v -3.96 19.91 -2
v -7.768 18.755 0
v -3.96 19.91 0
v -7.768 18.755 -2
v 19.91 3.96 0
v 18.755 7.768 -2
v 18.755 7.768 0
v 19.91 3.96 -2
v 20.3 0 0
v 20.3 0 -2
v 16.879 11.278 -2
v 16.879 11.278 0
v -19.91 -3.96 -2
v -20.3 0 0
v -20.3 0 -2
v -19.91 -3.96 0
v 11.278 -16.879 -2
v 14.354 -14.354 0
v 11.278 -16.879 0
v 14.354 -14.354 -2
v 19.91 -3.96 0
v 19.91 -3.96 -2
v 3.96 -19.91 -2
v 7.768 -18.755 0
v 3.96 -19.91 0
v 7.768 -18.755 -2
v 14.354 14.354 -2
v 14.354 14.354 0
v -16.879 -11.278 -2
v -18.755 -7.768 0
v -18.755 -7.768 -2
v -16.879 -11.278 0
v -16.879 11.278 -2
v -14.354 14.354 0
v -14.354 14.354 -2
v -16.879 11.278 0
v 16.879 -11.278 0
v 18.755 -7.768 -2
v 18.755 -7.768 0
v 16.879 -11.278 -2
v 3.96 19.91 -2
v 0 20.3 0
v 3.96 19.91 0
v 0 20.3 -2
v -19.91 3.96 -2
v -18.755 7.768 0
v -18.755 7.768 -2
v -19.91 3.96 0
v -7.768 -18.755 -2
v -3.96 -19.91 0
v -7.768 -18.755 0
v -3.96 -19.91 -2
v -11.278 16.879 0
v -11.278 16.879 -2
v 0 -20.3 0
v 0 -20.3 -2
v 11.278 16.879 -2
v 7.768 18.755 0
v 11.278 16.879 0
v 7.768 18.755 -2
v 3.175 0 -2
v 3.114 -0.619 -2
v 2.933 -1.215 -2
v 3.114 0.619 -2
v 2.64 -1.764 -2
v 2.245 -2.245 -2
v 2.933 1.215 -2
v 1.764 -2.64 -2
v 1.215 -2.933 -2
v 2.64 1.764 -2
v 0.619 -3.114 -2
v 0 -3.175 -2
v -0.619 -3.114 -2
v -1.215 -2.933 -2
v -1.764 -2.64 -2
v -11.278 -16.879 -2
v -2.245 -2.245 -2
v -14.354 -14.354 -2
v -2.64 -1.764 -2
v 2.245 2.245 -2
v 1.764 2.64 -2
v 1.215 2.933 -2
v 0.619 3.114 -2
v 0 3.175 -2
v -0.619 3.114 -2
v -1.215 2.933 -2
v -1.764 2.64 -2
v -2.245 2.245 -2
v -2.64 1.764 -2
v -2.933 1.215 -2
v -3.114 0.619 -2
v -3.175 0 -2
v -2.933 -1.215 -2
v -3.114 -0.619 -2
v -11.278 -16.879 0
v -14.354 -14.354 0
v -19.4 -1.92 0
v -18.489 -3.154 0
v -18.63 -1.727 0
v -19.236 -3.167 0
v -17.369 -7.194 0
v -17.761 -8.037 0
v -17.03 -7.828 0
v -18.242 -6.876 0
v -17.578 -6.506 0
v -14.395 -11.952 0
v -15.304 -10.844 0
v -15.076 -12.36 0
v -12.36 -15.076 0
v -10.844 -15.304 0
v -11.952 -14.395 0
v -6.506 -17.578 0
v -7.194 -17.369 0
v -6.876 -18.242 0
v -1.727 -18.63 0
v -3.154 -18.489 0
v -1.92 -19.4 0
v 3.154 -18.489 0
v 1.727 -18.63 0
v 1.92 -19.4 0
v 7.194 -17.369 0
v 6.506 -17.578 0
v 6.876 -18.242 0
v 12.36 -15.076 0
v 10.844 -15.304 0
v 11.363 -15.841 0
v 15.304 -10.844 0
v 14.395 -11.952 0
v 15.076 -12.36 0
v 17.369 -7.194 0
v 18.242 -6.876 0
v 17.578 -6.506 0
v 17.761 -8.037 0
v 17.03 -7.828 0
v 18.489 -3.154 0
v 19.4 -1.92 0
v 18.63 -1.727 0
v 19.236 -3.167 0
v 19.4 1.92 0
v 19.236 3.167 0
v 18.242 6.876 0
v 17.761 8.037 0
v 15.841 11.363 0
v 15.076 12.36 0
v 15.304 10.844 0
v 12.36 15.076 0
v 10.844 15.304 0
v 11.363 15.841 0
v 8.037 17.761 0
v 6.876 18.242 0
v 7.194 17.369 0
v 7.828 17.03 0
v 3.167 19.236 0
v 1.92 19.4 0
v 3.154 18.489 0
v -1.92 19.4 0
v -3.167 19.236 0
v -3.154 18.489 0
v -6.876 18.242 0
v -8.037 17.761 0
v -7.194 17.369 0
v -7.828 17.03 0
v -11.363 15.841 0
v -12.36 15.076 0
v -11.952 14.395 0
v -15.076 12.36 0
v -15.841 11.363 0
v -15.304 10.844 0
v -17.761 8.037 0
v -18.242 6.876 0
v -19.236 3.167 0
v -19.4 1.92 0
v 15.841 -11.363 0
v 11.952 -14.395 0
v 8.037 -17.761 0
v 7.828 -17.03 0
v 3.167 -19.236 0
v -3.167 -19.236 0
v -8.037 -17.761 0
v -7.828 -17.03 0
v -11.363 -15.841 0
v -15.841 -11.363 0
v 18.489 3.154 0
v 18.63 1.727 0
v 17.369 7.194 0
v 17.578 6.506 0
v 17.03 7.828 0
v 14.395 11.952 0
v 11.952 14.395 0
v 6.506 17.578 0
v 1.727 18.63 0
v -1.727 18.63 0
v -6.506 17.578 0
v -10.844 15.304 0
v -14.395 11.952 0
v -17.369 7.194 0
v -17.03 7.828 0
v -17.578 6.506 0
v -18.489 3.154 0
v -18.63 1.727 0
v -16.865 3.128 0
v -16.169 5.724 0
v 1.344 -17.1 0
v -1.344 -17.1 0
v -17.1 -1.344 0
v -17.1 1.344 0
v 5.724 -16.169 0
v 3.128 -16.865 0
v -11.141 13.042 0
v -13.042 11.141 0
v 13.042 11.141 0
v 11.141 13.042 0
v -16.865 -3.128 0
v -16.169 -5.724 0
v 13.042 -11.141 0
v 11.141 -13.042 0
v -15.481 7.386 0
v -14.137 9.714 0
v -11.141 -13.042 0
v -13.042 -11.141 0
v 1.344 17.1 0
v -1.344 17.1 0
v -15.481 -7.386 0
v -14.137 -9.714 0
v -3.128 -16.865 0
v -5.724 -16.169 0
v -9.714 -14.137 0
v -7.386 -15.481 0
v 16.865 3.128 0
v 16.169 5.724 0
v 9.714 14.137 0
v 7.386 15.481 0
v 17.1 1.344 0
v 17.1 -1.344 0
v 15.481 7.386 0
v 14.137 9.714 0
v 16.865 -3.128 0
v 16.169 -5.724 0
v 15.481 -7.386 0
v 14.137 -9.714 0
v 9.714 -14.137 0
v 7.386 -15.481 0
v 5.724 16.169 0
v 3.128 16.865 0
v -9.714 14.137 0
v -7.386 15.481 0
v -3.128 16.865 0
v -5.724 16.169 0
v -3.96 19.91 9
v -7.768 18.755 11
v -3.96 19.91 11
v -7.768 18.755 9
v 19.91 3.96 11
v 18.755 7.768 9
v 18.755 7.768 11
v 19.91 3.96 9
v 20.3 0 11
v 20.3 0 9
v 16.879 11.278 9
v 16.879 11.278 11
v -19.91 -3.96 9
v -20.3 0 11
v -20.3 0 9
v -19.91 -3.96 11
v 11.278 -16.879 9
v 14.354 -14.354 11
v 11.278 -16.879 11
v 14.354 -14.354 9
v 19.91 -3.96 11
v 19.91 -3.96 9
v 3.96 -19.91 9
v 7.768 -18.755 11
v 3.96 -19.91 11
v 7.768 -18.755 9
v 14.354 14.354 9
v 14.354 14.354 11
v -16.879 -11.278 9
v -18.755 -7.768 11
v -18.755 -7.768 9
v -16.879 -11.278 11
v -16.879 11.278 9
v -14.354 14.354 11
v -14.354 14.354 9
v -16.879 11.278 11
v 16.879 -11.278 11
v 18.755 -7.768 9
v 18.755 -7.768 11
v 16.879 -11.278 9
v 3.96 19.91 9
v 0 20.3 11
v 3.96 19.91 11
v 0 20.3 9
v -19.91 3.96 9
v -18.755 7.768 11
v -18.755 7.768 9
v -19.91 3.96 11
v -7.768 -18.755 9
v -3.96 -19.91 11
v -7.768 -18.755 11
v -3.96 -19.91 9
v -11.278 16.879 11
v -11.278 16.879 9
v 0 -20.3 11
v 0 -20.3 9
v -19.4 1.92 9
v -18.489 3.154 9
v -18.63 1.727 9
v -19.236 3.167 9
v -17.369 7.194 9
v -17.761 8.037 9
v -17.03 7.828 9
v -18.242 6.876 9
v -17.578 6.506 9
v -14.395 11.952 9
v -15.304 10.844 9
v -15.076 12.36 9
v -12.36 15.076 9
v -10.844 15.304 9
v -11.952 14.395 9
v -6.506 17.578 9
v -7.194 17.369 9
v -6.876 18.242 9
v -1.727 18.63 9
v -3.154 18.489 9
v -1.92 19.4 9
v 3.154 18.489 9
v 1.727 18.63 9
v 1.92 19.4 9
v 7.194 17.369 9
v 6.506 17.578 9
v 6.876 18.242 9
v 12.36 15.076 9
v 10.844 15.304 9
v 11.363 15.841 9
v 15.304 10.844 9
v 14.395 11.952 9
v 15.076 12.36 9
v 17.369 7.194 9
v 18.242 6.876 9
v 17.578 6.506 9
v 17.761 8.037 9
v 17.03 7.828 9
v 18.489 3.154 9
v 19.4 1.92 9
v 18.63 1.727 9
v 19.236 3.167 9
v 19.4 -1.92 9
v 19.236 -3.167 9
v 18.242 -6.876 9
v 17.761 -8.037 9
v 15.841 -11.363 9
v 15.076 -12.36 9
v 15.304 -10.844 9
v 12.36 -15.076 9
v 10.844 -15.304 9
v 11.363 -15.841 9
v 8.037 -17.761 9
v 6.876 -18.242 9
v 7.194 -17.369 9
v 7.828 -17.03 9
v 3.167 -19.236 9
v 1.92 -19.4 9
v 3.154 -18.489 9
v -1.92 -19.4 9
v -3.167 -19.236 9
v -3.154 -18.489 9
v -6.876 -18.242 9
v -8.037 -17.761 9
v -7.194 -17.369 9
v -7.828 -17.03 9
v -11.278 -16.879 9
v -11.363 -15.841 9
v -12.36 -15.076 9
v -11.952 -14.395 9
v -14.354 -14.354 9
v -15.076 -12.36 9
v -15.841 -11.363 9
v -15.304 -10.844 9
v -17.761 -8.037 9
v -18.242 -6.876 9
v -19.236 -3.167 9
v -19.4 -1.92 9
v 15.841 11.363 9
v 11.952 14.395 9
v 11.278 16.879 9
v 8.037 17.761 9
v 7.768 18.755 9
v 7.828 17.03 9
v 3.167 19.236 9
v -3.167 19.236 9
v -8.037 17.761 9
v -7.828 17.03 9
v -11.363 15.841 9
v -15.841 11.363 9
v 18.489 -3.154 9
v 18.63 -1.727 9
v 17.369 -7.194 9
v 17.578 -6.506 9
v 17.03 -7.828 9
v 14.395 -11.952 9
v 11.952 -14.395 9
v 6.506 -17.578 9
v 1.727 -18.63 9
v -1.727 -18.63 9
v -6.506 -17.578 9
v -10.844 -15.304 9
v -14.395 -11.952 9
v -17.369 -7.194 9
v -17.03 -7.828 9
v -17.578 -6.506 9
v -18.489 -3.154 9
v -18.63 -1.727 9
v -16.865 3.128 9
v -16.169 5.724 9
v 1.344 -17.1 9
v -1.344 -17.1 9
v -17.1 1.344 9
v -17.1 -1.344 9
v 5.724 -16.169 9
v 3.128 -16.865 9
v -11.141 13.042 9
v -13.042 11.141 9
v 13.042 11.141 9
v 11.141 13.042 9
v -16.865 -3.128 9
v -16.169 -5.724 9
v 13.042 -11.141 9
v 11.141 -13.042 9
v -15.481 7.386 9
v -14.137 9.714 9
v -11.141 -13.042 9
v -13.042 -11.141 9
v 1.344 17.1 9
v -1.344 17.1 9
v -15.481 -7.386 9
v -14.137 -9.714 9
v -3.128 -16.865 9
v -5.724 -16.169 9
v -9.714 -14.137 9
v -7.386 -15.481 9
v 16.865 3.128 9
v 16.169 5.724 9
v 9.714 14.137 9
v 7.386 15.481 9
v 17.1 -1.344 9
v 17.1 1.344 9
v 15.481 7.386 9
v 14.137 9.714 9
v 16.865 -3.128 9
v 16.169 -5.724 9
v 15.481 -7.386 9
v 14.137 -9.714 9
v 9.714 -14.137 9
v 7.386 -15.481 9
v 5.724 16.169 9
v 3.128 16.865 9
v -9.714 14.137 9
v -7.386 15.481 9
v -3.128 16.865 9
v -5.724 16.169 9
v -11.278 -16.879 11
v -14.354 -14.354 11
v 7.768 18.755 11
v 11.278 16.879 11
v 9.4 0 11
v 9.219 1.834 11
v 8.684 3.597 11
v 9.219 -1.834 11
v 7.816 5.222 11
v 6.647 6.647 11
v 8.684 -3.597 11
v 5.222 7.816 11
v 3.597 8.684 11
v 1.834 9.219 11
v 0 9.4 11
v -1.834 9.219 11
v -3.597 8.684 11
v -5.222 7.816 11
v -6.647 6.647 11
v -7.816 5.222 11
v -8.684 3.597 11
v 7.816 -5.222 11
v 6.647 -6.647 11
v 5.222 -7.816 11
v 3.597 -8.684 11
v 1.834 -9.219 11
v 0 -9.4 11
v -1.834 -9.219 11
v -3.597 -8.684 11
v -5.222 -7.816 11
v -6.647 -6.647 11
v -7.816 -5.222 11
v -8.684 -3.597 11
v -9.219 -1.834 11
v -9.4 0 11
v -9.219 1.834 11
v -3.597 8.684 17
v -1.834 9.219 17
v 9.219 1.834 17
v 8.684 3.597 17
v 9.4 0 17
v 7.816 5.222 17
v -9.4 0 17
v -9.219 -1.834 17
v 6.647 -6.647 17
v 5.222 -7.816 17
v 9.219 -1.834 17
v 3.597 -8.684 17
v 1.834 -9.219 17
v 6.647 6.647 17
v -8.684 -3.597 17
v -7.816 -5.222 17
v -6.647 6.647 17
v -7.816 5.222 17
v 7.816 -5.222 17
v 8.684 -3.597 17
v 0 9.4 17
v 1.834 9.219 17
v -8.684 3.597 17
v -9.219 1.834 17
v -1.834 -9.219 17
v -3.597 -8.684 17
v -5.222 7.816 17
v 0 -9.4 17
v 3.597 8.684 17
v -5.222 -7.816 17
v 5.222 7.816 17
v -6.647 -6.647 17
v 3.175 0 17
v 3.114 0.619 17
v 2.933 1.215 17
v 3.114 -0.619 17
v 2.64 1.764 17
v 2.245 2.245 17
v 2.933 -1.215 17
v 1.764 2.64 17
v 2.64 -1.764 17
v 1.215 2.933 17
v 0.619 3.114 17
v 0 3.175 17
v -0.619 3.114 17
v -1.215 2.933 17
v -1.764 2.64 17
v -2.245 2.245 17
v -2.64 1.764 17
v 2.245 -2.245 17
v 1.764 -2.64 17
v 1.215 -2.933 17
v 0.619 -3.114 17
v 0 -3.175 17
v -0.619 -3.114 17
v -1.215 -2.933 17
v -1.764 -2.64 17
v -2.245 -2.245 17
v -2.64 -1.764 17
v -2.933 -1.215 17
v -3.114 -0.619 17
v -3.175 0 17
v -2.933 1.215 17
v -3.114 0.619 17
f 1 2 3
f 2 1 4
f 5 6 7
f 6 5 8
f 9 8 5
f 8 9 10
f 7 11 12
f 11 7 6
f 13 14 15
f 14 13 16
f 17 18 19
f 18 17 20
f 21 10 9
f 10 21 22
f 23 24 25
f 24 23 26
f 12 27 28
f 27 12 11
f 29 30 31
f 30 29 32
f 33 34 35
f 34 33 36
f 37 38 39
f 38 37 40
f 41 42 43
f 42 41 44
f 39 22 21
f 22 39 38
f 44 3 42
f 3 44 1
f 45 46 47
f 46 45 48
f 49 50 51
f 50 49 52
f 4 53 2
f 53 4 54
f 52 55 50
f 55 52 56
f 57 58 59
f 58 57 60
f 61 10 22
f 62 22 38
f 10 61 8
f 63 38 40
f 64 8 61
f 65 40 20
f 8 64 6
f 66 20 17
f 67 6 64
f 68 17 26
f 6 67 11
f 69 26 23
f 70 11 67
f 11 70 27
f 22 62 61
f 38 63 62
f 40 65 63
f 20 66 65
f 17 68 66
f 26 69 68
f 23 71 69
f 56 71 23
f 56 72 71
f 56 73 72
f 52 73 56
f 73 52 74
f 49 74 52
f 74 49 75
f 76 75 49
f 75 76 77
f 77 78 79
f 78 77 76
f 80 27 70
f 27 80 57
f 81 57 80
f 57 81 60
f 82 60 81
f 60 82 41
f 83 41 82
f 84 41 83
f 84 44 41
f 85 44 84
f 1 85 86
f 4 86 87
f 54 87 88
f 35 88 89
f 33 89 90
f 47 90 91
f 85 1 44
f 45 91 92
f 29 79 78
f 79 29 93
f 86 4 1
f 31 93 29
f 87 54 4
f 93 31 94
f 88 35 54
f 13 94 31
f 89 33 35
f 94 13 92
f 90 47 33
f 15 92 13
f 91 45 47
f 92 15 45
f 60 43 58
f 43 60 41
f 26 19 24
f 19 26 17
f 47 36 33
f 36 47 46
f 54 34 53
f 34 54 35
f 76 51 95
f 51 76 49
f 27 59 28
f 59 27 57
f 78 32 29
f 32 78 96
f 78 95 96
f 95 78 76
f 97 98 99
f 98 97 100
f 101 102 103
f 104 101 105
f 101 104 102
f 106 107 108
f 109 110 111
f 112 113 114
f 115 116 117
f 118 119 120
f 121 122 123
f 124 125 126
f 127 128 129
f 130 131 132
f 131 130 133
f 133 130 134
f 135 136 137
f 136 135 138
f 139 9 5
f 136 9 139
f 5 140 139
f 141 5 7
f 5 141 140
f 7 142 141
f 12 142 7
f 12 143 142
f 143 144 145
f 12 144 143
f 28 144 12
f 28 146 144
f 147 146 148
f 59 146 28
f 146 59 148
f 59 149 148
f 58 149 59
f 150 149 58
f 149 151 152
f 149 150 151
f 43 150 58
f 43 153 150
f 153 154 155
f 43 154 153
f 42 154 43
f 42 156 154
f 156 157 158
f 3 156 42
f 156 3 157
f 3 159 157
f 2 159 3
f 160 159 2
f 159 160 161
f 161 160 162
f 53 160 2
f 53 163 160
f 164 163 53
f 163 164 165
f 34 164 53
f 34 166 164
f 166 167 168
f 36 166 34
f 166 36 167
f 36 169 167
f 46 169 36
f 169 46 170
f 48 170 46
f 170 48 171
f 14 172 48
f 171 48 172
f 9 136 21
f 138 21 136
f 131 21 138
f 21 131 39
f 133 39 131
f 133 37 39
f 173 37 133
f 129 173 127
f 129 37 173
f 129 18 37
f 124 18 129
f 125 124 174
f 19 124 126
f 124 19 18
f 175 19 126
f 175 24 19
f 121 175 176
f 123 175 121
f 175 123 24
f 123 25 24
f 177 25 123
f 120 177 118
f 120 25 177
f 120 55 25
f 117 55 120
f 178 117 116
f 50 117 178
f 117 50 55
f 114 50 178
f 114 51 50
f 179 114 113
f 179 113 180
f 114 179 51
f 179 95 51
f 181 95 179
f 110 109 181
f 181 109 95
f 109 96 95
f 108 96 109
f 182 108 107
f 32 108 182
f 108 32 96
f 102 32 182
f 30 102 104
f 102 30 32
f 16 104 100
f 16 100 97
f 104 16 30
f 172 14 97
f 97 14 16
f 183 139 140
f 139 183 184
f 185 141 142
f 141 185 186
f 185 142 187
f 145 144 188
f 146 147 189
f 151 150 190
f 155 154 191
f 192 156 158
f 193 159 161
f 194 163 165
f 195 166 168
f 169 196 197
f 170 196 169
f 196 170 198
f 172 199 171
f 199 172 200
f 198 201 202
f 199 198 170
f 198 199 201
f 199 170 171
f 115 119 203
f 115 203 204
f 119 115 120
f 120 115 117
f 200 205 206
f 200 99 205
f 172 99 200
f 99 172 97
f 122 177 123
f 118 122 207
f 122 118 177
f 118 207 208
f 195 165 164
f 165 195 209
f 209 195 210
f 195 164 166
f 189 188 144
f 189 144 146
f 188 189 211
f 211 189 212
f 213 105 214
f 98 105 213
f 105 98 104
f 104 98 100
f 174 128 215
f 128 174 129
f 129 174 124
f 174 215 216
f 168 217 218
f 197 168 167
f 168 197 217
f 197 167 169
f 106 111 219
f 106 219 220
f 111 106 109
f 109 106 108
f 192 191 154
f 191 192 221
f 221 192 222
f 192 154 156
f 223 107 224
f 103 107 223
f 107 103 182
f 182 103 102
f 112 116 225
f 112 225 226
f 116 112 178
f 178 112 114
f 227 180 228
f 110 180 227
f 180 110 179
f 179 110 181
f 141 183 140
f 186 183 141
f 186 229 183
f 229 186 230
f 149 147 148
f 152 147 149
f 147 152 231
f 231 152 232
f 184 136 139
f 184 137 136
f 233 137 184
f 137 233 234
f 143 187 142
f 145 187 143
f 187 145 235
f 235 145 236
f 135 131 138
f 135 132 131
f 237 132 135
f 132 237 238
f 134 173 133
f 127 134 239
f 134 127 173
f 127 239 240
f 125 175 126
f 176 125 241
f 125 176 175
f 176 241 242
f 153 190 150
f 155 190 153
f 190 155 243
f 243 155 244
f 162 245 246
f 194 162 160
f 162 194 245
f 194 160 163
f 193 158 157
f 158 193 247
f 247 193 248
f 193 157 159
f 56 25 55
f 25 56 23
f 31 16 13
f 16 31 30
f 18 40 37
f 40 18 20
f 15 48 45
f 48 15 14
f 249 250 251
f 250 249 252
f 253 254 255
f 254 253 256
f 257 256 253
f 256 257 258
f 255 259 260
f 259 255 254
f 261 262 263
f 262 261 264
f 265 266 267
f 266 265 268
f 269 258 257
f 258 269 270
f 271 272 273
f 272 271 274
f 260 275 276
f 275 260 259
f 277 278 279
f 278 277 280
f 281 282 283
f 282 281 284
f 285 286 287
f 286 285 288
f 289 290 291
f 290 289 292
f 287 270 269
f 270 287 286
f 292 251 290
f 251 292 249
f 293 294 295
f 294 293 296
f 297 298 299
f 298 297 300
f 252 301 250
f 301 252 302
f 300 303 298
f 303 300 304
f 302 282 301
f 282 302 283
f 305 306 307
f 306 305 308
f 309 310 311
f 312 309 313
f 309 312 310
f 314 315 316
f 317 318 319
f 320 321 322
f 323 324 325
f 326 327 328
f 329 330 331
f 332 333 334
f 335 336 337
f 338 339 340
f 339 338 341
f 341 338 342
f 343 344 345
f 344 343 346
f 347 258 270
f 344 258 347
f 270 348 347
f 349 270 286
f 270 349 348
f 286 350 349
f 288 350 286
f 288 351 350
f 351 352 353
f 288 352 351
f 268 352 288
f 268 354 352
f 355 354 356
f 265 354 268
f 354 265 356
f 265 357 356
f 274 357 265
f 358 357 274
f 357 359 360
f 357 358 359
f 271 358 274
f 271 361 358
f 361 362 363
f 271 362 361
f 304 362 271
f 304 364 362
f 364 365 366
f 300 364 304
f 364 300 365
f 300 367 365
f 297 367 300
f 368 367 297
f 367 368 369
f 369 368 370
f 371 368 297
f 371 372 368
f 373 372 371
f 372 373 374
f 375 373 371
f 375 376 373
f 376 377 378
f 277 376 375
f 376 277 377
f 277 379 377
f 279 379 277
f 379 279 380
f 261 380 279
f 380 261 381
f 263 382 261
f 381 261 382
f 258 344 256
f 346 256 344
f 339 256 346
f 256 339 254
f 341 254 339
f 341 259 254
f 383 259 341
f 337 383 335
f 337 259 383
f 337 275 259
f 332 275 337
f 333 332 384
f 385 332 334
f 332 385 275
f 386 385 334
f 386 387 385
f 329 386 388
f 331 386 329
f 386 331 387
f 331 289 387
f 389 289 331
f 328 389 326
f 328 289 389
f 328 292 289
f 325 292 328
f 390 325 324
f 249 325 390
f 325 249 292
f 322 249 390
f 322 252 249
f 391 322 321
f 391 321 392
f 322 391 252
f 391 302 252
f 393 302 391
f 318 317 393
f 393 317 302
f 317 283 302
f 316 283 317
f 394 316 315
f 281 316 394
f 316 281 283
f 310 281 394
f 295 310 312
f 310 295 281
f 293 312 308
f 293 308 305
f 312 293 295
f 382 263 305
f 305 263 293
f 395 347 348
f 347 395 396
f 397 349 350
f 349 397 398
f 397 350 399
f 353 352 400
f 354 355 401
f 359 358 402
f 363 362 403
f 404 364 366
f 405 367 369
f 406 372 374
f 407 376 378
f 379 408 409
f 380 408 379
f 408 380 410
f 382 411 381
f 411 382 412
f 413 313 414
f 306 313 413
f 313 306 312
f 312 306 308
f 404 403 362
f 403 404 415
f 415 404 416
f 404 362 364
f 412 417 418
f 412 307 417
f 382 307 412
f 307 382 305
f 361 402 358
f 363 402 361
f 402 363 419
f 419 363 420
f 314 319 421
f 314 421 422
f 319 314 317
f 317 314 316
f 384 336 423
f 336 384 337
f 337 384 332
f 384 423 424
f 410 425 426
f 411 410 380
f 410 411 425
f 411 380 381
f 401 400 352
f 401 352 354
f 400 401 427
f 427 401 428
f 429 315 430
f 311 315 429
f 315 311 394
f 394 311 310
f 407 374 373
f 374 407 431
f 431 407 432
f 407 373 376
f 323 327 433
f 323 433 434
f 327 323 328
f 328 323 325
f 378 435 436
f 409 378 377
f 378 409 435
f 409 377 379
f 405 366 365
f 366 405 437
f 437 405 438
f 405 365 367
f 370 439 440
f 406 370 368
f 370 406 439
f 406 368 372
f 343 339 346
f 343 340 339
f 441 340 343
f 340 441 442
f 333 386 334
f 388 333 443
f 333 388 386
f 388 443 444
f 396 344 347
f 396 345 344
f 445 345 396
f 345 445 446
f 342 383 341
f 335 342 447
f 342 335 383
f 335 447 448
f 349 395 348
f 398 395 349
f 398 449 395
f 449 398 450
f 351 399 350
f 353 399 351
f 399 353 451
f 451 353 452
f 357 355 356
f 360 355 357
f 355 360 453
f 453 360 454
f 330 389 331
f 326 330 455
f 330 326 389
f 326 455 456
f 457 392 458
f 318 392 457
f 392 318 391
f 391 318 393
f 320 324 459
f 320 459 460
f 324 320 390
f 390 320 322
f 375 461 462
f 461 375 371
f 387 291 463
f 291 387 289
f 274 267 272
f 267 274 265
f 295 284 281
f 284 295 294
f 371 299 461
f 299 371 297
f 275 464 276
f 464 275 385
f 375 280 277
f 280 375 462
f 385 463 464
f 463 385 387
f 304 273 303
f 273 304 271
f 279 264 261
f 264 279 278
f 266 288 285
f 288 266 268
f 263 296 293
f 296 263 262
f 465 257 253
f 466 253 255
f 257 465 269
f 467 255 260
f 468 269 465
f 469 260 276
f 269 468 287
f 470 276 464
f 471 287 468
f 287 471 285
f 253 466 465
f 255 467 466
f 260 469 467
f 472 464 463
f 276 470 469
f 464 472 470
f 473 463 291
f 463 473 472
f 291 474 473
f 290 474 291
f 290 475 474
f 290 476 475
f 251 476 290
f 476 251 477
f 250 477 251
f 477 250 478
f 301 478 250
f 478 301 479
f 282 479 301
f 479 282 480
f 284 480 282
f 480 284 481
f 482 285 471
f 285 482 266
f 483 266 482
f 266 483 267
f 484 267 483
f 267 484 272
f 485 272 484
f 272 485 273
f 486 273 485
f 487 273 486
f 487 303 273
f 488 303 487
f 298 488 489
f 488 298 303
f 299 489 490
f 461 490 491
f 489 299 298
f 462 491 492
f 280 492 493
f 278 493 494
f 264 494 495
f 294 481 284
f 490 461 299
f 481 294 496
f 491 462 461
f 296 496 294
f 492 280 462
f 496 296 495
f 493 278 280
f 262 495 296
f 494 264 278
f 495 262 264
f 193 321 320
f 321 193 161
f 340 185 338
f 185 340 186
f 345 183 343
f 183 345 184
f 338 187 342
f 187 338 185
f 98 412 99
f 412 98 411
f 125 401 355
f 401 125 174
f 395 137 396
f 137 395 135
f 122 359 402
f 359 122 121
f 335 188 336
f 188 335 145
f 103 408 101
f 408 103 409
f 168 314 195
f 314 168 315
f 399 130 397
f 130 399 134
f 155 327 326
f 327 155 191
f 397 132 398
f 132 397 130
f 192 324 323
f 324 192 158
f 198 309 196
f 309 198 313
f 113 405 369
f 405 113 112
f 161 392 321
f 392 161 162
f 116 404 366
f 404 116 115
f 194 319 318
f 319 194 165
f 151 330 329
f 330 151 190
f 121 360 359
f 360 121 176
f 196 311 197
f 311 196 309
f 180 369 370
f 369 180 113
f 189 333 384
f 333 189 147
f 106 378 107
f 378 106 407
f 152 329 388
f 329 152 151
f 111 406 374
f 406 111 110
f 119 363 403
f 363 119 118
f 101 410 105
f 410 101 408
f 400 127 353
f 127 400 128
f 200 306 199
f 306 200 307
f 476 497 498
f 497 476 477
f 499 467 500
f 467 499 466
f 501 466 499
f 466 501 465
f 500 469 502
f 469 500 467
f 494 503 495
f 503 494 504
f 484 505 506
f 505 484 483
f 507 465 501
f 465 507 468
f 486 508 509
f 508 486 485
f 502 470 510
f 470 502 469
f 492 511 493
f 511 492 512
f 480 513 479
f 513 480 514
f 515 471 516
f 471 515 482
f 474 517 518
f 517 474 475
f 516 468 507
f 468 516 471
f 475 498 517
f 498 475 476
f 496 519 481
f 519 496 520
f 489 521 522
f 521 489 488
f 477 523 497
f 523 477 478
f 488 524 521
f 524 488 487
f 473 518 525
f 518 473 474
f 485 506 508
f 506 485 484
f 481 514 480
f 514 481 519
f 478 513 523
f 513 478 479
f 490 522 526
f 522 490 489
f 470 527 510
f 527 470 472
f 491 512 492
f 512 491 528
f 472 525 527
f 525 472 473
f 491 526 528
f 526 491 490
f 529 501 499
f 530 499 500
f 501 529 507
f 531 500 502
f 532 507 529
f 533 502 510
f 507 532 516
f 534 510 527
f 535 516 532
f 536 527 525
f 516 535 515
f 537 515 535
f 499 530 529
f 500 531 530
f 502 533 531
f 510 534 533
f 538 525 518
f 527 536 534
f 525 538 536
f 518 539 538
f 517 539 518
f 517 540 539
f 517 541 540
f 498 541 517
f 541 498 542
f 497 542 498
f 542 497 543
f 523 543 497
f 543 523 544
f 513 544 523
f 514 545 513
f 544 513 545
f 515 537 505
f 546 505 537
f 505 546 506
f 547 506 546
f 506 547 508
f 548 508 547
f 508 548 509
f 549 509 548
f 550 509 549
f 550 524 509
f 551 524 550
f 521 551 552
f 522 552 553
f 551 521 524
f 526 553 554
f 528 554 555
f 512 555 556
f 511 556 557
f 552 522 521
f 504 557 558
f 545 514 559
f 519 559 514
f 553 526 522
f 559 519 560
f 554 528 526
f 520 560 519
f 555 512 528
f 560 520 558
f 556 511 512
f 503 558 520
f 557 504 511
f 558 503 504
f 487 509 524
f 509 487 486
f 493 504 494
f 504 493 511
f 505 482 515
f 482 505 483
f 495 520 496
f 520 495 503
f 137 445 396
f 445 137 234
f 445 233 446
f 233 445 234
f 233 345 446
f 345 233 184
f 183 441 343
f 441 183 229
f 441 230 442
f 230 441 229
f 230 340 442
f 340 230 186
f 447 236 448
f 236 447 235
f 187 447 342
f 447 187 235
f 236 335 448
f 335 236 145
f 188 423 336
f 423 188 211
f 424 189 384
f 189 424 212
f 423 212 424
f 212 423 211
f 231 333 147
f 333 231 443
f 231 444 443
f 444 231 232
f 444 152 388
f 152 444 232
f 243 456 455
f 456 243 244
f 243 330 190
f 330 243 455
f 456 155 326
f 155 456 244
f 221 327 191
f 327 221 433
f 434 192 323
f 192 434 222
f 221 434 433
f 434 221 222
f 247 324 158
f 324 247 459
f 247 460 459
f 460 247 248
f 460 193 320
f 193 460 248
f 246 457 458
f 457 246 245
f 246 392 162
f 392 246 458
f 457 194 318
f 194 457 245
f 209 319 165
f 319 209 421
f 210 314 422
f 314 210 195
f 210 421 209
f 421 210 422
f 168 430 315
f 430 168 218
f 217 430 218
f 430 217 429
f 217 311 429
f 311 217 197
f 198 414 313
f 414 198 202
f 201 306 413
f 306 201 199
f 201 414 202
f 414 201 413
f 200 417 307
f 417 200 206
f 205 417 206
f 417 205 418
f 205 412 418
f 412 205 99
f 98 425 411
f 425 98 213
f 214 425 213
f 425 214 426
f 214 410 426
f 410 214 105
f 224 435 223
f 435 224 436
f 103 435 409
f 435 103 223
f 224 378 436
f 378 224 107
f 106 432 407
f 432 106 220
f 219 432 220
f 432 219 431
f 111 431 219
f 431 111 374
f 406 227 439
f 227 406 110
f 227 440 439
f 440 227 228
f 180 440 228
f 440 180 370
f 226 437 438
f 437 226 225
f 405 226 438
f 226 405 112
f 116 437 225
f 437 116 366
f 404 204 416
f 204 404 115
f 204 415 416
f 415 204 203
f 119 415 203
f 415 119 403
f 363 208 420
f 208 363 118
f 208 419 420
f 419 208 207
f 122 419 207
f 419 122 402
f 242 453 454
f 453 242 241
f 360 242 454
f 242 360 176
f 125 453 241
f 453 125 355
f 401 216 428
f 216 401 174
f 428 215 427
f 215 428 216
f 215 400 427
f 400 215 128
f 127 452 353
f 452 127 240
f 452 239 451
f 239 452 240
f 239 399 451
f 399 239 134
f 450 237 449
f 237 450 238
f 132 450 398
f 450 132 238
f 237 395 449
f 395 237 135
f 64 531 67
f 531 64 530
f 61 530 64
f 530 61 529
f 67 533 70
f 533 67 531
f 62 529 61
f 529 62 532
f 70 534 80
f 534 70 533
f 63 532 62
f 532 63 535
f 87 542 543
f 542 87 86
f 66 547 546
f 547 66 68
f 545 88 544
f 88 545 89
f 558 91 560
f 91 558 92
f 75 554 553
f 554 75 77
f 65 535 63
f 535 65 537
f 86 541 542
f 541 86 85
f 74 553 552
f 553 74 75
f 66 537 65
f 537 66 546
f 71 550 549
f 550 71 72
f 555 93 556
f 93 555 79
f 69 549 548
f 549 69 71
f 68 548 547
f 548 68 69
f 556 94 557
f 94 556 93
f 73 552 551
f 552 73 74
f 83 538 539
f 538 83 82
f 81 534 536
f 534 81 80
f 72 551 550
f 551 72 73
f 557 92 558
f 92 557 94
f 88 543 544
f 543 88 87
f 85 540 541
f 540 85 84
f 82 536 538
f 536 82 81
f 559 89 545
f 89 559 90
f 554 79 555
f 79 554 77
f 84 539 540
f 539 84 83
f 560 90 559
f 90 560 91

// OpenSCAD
$fn = 32;
// ----------------------------------------------------------------------
// Timing pulley: HTD5 24T, pitch 5 mm, 40.6 mm x 19 mm
// ----------------------------------------------------------------------

// --- parameters (mm) ---
pitch = 5;                // belt pitch
teeth = 24;               // number of grooves
belt_w = 9;               // belt width between the flanges
tip_d = 37.6;             // tip circle diameter
root_d = 35.4;            // groove bottom diameter
groove_h = 1.1;           // groove depth
tooth_w = 3.2;            // groove width at the tip circle
flange_d = 40.6;          // flange diameter
flange_t = 2;             // flange thickness
spigot_d = 33.8;          // flange spigot, sunk into the rim
spigot_h = 1.2;           // spigot depth into the rim
bore_d = 6.35;            // shaft bore
hub_d = 18.8;             // hub diameter
hub_h = 6;                // hub above the flange
bottom_z = -2;            // lowest point of the pulley
top_z = 17;               // highest point of the pulley

module rim() {
  cylinder(h = belt_w, d = tip_d);
}

module groove_cutter() {
  /* belt tooth groove: deeper than wide, cut through the belt width */
  translate([root_d / 2, 0, 0])
    linear_extrude(height = belt_w)
      polygon(points = [[-0.6, -tooth_w * 0.42], [groove_h + 0.6, -tooth_w * 0.6],
                        [groove_h + 0.6, tooth_w * 0.6], [-0.6, tooth_w * 0.42]]);
}

module flanges() {
  translate([0, 0, -flange_t]) cylinder(h = flange_t, d = flange_d);
  translate([0, 0, belt_w]) cylinder(h = flange_t, d = flange_d);
  translate([0, 0, -spigot_h]) cylinder(h = spigot_h + 0.6, d = spigot_d);
  translate([0, 0, belt_w - 0.6]) cylinder(h = spigot_h + 0.6, d = spigot_d);
}

module hub() {
  translate([0, 0, bottom_z]) cylinder(h = top_z - bottom_z, d = hub_d);
}

difference() {
  union() {
    rim();
    hub();
    flanges();
  }
  for (i = [0 : teeth - 1]) rotate([0, 0, i * 360 / teeth]) groove_cutter();
  translate([0, 0, bottom_z - 1]) cylinder(h = top_z - bottom_z + 2, d = bore_d);
}
